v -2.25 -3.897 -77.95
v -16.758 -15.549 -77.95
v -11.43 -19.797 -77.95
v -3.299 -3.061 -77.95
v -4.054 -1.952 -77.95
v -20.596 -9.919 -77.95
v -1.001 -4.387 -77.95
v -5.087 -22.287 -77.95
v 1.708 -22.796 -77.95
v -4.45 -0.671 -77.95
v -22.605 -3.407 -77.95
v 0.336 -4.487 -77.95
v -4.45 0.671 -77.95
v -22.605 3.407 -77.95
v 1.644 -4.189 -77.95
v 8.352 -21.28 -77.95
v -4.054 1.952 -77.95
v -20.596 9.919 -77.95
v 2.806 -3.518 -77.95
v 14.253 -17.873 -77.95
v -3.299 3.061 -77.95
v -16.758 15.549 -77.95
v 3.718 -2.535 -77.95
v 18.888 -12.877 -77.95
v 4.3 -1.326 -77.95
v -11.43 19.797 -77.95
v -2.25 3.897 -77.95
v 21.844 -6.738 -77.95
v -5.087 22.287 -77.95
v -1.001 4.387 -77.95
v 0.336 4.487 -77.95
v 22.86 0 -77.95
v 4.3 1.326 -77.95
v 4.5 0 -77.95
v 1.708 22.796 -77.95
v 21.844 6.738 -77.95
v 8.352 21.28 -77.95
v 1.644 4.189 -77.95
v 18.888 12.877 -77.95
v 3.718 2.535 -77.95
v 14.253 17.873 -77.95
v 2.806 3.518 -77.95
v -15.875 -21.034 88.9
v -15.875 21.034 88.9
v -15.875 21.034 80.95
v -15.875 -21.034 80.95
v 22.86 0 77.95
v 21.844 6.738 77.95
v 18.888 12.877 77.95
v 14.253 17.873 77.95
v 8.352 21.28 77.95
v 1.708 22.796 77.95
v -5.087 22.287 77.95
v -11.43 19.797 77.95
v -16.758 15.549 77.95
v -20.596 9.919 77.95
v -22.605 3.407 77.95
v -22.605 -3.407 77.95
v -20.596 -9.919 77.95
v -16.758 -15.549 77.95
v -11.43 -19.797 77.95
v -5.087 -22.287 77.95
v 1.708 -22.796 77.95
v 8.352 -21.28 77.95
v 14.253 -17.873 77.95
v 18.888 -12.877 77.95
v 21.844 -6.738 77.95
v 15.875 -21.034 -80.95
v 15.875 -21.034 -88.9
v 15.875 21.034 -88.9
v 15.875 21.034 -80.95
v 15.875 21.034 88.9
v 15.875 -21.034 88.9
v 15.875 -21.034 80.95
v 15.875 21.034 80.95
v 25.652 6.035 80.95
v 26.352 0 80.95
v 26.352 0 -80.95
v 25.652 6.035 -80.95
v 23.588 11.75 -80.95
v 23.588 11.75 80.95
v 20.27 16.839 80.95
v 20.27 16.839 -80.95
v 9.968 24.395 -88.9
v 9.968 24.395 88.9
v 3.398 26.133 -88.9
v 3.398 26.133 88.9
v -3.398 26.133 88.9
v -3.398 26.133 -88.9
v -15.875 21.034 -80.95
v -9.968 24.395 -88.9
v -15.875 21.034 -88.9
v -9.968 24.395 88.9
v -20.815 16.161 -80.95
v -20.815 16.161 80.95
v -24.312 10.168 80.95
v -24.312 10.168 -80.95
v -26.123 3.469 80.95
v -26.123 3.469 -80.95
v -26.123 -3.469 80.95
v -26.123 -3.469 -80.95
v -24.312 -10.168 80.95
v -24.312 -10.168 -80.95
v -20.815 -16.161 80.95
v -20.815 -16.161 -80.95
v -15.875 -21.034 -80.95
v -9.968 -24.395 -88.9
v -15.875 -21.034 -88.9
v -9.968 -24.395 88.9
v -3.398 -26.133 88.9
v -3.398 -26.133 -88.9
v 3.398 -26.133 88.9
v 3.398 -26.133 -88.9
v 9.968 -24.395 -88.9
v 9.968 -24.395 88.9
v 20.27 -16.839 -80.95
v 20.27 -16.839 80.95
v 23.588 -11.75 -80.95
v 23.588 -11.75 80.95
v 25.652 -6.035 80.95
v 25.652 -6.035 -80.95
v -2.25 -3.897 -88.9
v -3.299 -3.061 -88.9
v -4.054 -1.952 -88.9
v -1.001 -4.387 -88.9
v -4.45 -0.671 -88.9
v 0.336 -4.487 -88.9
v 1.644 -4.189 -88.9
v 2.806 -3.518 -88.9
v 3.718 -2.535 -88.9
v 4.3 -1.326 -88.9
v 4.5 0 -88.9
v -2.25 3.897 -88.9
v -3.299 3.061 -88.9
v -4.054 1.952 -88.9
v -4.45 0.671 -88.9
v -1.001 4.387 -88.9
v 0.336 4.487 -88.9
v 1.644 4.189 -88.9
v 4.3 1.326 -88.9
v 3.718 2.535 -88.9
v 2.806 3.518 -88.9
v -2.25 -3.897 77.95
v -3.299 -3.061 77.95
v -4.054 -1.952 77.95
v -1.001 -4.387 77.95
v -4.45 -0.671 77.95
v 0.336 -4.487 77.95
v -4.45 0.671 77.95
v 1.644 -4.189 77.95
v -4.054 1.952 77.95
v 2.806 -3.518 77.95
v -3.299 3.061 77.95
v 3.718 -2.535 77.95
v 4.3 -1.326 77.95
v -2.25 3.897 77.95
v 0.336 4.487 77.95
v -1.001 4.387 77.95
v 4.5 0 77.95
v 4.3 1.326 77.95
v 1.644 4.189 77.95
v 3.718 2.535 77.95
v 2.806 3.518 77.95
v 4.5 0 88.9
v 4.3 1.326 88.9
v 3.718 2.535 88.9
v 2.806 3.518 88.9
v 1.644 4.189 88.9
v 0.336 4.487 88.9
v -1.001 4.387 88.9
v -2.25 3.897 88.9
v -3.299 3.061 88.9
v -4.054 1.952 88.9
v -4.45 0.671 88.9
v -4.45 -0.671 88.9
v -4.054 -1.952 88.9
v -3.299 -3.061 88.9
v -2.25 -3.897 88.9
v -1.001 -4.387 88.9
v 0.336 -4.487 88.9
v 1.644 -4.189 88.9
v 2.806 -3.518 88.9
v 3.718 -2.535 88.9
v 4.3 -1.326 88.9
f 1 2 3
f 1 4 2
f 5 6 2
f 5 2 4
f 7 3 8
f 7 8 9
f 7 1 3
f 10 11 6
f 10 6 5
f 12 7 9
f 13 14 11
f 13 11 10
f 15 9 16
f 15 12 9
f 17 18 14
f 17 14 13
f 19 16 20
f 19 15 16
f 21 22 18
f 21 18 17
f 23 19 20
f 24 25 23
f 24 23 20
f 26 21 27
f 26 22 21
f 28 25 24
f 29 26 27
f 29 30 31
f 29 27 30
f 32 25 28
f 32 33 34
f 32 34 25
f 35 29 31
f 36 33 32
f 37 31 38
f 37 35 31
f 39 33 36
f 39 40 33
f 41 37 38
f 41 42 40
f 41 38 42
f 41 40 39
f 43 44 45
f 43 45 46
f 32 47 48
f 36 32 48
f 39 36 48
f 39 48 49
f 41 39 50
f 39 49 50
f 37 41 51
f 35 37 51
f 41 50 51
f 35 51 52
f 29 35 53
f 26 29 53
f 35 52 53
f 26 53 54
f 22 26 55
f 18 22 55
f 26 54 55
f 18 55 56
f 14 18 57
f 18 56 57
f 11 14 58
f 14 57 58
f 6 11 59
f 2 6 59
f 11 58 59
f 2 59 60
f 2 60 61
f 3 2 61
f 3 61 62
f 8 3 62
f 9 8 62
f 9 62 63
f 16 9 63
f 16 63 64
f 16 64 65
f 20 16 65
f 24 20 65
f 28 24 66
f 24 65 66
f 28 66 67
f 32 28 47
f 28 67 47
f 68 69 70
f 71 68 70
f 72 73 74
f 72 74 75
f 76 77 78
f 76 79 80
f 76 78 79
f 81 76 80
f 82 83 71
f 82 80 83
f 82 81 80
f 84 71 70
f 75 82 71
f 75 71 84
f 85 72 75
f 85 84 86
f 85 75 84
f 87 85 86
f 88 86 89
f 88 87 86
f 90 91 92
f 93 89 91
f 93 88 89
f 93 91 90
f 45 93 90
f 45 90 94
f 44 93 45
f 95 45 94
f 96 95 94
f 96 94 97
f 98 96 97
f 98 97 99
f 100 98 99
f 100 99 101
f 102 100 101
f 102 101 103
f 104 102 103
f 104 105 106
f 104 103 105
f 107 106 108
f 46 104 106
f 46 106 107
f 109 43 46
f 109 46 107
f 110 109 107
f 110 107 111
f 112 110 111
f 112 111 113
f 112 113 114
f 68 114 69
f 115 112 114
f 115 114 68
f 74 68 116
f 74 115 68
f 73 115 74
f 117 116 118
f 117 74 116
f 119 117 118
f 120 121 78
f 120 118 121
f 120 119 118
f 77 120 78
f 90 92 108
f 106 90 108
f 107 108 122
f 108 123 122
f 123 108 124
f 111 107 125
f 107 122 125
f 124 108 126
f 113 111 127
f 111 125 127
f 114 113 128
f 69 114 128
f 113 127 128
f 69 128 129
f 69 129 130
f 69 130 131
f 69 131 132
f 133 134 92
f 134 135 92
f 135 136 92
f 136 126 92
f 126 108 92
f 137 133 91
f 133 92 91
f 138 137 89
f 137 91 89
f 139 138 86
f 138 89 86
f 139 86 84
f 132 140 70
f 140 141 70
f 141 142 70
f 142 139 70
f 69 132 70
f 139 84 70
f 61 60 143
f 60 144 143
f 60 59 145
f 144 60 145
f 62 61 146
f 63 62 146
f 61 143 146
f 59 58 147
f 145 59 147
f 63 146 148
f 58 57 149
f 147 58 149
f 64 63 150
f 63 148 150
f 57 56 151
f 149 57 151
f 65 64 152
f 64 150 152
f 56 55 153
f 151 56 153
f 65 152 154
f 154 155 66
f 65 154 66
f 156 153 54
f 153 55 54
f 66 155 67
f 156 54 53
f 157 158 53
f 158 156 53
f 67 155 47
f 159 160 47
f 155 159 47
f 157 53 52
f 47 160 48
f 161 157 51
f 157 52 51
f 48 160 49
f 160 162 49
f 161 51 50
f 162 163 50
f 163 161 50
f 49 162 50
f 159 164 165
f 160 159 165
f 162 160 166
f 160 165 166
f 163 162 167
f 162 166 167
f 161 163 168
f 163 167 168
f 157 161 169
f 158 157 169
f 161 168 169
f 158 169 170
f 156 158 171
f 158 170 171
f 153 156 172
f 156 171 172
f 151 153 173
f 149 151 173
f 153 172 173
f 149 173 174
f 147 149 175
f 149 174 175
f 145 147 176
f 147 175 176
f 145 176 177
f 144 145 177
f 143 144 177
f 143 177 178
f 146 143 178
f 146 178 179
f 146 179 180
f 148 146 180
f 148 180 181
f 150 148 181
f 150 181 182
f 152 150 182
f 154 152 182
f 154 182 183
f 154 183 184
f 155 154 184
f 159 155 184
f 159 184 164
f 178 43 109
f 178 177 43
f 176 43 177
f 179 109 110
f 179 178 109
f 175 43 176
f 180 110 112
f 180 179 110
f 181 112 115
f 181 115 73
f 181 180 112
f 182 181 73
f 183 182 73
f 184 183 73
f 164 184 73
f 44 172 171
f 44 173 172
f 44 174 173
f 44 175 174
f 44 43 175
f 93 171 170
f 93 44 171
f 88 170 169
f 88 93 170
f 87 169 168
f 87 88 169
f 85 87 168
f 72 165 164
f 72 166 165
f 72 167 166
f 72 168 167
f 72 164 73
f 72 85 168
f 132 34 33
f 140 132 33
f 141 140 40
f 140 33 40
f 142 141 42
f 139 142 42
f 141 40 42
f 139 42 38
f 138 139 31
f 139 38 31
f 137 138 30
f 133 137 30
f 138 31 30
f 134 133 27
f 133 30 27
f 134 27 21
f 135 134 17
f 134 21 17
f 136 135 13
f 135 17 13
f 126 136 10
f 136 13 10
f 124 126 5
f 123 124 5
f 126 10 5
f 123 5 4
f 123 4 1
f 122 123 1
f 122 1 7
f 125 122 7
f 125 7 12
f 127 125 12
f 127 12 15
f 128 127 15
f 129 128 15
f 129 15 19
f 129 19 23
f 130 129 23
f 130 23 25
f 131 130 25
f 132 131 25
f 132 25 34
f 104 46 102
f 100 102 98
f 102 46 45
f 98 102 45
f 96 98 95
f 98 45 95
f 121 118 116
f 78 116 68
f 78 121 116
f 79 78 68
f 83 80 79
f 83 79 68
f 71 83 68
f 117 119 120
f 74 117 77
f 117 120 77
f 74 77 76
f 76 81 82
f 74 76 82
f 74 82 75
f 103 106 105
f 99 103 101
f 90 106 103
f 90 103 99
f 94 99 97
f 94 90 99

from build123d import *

# Parameters (mm, degrees)
SKETCH1_R           = 26.3525
BOSS_EXTRUDE1_DEPTH = 88.9
CUT_EXTRUDE1_DEPTH  = 7.9502
CUT_EXTRUDE2_START  = -3
SKETCH3_R           = 22.86
CUT_EXTRUDE2_DEPTH  = 155.8996
SKETCH5_R           = 4.5
CUT_EXTRUDE3_DEPTH  = 182.663833804


with BuildPart() as part:
    # Sketch1 → Boss-Extrude1 (new, symmetric)
    with BuildSketch(Plane.XY):
        Circle(SKETCH1_R)
    extrude(amount=BOSS_EXTRUDE1_DEPTH, both=True)

    # Sketch2 → Cut-Extrude1 (cut)
    with BuildSketch(Plane.XY.offset(88.9)):
        with BuildLine():
            Line((-15.875, 21.034225235), (-15.875, -21.034225235))
            ThreePointArc((-15.875, -21.034225235), (-26.3525, 0), (-15.875, 21.034225235))
        make_face()
        with BuildLine():
            Line((15.875, -21.034225235), (15.875, 21.034225235))
            ThreePointArc((15.875, 21.034225235), (26.3525, 0), (15.875, -21.034225235))
        make_face()
    cut_extrude1 = extrude(amount=-CUT_EXTRUDE1_DEPTH, mode=Mode.SUBTRACT)

    # Mirror1: Cut-Extrude1 across plane
    add(cut_extrude1.mirror(Plane.XY), mode=Mode.SUBTRACT)

    # Sketch3 → Cut-Extrude2 (cut)
    with BuildSketch(Plane.XY.offset(80.9498).offset(CUT_EXTRUDE2_START)):
        Circle(SKETCH3_R)
    extrude(amount=-CUT_EXTRUDE2_DEPTH, mode=Mode.SUBTRACT)

    # Sketch5 → Cut-Extrude3 (cut, through all)
    with BuildSketch(Plane.XY.offset(88.9)):
        Circle(SKETCH5_R)
    extrude(amount=-CUT_EXTRUDE3_DEPTH, mode=Mode.SUBTRACT)


solid = part.part
